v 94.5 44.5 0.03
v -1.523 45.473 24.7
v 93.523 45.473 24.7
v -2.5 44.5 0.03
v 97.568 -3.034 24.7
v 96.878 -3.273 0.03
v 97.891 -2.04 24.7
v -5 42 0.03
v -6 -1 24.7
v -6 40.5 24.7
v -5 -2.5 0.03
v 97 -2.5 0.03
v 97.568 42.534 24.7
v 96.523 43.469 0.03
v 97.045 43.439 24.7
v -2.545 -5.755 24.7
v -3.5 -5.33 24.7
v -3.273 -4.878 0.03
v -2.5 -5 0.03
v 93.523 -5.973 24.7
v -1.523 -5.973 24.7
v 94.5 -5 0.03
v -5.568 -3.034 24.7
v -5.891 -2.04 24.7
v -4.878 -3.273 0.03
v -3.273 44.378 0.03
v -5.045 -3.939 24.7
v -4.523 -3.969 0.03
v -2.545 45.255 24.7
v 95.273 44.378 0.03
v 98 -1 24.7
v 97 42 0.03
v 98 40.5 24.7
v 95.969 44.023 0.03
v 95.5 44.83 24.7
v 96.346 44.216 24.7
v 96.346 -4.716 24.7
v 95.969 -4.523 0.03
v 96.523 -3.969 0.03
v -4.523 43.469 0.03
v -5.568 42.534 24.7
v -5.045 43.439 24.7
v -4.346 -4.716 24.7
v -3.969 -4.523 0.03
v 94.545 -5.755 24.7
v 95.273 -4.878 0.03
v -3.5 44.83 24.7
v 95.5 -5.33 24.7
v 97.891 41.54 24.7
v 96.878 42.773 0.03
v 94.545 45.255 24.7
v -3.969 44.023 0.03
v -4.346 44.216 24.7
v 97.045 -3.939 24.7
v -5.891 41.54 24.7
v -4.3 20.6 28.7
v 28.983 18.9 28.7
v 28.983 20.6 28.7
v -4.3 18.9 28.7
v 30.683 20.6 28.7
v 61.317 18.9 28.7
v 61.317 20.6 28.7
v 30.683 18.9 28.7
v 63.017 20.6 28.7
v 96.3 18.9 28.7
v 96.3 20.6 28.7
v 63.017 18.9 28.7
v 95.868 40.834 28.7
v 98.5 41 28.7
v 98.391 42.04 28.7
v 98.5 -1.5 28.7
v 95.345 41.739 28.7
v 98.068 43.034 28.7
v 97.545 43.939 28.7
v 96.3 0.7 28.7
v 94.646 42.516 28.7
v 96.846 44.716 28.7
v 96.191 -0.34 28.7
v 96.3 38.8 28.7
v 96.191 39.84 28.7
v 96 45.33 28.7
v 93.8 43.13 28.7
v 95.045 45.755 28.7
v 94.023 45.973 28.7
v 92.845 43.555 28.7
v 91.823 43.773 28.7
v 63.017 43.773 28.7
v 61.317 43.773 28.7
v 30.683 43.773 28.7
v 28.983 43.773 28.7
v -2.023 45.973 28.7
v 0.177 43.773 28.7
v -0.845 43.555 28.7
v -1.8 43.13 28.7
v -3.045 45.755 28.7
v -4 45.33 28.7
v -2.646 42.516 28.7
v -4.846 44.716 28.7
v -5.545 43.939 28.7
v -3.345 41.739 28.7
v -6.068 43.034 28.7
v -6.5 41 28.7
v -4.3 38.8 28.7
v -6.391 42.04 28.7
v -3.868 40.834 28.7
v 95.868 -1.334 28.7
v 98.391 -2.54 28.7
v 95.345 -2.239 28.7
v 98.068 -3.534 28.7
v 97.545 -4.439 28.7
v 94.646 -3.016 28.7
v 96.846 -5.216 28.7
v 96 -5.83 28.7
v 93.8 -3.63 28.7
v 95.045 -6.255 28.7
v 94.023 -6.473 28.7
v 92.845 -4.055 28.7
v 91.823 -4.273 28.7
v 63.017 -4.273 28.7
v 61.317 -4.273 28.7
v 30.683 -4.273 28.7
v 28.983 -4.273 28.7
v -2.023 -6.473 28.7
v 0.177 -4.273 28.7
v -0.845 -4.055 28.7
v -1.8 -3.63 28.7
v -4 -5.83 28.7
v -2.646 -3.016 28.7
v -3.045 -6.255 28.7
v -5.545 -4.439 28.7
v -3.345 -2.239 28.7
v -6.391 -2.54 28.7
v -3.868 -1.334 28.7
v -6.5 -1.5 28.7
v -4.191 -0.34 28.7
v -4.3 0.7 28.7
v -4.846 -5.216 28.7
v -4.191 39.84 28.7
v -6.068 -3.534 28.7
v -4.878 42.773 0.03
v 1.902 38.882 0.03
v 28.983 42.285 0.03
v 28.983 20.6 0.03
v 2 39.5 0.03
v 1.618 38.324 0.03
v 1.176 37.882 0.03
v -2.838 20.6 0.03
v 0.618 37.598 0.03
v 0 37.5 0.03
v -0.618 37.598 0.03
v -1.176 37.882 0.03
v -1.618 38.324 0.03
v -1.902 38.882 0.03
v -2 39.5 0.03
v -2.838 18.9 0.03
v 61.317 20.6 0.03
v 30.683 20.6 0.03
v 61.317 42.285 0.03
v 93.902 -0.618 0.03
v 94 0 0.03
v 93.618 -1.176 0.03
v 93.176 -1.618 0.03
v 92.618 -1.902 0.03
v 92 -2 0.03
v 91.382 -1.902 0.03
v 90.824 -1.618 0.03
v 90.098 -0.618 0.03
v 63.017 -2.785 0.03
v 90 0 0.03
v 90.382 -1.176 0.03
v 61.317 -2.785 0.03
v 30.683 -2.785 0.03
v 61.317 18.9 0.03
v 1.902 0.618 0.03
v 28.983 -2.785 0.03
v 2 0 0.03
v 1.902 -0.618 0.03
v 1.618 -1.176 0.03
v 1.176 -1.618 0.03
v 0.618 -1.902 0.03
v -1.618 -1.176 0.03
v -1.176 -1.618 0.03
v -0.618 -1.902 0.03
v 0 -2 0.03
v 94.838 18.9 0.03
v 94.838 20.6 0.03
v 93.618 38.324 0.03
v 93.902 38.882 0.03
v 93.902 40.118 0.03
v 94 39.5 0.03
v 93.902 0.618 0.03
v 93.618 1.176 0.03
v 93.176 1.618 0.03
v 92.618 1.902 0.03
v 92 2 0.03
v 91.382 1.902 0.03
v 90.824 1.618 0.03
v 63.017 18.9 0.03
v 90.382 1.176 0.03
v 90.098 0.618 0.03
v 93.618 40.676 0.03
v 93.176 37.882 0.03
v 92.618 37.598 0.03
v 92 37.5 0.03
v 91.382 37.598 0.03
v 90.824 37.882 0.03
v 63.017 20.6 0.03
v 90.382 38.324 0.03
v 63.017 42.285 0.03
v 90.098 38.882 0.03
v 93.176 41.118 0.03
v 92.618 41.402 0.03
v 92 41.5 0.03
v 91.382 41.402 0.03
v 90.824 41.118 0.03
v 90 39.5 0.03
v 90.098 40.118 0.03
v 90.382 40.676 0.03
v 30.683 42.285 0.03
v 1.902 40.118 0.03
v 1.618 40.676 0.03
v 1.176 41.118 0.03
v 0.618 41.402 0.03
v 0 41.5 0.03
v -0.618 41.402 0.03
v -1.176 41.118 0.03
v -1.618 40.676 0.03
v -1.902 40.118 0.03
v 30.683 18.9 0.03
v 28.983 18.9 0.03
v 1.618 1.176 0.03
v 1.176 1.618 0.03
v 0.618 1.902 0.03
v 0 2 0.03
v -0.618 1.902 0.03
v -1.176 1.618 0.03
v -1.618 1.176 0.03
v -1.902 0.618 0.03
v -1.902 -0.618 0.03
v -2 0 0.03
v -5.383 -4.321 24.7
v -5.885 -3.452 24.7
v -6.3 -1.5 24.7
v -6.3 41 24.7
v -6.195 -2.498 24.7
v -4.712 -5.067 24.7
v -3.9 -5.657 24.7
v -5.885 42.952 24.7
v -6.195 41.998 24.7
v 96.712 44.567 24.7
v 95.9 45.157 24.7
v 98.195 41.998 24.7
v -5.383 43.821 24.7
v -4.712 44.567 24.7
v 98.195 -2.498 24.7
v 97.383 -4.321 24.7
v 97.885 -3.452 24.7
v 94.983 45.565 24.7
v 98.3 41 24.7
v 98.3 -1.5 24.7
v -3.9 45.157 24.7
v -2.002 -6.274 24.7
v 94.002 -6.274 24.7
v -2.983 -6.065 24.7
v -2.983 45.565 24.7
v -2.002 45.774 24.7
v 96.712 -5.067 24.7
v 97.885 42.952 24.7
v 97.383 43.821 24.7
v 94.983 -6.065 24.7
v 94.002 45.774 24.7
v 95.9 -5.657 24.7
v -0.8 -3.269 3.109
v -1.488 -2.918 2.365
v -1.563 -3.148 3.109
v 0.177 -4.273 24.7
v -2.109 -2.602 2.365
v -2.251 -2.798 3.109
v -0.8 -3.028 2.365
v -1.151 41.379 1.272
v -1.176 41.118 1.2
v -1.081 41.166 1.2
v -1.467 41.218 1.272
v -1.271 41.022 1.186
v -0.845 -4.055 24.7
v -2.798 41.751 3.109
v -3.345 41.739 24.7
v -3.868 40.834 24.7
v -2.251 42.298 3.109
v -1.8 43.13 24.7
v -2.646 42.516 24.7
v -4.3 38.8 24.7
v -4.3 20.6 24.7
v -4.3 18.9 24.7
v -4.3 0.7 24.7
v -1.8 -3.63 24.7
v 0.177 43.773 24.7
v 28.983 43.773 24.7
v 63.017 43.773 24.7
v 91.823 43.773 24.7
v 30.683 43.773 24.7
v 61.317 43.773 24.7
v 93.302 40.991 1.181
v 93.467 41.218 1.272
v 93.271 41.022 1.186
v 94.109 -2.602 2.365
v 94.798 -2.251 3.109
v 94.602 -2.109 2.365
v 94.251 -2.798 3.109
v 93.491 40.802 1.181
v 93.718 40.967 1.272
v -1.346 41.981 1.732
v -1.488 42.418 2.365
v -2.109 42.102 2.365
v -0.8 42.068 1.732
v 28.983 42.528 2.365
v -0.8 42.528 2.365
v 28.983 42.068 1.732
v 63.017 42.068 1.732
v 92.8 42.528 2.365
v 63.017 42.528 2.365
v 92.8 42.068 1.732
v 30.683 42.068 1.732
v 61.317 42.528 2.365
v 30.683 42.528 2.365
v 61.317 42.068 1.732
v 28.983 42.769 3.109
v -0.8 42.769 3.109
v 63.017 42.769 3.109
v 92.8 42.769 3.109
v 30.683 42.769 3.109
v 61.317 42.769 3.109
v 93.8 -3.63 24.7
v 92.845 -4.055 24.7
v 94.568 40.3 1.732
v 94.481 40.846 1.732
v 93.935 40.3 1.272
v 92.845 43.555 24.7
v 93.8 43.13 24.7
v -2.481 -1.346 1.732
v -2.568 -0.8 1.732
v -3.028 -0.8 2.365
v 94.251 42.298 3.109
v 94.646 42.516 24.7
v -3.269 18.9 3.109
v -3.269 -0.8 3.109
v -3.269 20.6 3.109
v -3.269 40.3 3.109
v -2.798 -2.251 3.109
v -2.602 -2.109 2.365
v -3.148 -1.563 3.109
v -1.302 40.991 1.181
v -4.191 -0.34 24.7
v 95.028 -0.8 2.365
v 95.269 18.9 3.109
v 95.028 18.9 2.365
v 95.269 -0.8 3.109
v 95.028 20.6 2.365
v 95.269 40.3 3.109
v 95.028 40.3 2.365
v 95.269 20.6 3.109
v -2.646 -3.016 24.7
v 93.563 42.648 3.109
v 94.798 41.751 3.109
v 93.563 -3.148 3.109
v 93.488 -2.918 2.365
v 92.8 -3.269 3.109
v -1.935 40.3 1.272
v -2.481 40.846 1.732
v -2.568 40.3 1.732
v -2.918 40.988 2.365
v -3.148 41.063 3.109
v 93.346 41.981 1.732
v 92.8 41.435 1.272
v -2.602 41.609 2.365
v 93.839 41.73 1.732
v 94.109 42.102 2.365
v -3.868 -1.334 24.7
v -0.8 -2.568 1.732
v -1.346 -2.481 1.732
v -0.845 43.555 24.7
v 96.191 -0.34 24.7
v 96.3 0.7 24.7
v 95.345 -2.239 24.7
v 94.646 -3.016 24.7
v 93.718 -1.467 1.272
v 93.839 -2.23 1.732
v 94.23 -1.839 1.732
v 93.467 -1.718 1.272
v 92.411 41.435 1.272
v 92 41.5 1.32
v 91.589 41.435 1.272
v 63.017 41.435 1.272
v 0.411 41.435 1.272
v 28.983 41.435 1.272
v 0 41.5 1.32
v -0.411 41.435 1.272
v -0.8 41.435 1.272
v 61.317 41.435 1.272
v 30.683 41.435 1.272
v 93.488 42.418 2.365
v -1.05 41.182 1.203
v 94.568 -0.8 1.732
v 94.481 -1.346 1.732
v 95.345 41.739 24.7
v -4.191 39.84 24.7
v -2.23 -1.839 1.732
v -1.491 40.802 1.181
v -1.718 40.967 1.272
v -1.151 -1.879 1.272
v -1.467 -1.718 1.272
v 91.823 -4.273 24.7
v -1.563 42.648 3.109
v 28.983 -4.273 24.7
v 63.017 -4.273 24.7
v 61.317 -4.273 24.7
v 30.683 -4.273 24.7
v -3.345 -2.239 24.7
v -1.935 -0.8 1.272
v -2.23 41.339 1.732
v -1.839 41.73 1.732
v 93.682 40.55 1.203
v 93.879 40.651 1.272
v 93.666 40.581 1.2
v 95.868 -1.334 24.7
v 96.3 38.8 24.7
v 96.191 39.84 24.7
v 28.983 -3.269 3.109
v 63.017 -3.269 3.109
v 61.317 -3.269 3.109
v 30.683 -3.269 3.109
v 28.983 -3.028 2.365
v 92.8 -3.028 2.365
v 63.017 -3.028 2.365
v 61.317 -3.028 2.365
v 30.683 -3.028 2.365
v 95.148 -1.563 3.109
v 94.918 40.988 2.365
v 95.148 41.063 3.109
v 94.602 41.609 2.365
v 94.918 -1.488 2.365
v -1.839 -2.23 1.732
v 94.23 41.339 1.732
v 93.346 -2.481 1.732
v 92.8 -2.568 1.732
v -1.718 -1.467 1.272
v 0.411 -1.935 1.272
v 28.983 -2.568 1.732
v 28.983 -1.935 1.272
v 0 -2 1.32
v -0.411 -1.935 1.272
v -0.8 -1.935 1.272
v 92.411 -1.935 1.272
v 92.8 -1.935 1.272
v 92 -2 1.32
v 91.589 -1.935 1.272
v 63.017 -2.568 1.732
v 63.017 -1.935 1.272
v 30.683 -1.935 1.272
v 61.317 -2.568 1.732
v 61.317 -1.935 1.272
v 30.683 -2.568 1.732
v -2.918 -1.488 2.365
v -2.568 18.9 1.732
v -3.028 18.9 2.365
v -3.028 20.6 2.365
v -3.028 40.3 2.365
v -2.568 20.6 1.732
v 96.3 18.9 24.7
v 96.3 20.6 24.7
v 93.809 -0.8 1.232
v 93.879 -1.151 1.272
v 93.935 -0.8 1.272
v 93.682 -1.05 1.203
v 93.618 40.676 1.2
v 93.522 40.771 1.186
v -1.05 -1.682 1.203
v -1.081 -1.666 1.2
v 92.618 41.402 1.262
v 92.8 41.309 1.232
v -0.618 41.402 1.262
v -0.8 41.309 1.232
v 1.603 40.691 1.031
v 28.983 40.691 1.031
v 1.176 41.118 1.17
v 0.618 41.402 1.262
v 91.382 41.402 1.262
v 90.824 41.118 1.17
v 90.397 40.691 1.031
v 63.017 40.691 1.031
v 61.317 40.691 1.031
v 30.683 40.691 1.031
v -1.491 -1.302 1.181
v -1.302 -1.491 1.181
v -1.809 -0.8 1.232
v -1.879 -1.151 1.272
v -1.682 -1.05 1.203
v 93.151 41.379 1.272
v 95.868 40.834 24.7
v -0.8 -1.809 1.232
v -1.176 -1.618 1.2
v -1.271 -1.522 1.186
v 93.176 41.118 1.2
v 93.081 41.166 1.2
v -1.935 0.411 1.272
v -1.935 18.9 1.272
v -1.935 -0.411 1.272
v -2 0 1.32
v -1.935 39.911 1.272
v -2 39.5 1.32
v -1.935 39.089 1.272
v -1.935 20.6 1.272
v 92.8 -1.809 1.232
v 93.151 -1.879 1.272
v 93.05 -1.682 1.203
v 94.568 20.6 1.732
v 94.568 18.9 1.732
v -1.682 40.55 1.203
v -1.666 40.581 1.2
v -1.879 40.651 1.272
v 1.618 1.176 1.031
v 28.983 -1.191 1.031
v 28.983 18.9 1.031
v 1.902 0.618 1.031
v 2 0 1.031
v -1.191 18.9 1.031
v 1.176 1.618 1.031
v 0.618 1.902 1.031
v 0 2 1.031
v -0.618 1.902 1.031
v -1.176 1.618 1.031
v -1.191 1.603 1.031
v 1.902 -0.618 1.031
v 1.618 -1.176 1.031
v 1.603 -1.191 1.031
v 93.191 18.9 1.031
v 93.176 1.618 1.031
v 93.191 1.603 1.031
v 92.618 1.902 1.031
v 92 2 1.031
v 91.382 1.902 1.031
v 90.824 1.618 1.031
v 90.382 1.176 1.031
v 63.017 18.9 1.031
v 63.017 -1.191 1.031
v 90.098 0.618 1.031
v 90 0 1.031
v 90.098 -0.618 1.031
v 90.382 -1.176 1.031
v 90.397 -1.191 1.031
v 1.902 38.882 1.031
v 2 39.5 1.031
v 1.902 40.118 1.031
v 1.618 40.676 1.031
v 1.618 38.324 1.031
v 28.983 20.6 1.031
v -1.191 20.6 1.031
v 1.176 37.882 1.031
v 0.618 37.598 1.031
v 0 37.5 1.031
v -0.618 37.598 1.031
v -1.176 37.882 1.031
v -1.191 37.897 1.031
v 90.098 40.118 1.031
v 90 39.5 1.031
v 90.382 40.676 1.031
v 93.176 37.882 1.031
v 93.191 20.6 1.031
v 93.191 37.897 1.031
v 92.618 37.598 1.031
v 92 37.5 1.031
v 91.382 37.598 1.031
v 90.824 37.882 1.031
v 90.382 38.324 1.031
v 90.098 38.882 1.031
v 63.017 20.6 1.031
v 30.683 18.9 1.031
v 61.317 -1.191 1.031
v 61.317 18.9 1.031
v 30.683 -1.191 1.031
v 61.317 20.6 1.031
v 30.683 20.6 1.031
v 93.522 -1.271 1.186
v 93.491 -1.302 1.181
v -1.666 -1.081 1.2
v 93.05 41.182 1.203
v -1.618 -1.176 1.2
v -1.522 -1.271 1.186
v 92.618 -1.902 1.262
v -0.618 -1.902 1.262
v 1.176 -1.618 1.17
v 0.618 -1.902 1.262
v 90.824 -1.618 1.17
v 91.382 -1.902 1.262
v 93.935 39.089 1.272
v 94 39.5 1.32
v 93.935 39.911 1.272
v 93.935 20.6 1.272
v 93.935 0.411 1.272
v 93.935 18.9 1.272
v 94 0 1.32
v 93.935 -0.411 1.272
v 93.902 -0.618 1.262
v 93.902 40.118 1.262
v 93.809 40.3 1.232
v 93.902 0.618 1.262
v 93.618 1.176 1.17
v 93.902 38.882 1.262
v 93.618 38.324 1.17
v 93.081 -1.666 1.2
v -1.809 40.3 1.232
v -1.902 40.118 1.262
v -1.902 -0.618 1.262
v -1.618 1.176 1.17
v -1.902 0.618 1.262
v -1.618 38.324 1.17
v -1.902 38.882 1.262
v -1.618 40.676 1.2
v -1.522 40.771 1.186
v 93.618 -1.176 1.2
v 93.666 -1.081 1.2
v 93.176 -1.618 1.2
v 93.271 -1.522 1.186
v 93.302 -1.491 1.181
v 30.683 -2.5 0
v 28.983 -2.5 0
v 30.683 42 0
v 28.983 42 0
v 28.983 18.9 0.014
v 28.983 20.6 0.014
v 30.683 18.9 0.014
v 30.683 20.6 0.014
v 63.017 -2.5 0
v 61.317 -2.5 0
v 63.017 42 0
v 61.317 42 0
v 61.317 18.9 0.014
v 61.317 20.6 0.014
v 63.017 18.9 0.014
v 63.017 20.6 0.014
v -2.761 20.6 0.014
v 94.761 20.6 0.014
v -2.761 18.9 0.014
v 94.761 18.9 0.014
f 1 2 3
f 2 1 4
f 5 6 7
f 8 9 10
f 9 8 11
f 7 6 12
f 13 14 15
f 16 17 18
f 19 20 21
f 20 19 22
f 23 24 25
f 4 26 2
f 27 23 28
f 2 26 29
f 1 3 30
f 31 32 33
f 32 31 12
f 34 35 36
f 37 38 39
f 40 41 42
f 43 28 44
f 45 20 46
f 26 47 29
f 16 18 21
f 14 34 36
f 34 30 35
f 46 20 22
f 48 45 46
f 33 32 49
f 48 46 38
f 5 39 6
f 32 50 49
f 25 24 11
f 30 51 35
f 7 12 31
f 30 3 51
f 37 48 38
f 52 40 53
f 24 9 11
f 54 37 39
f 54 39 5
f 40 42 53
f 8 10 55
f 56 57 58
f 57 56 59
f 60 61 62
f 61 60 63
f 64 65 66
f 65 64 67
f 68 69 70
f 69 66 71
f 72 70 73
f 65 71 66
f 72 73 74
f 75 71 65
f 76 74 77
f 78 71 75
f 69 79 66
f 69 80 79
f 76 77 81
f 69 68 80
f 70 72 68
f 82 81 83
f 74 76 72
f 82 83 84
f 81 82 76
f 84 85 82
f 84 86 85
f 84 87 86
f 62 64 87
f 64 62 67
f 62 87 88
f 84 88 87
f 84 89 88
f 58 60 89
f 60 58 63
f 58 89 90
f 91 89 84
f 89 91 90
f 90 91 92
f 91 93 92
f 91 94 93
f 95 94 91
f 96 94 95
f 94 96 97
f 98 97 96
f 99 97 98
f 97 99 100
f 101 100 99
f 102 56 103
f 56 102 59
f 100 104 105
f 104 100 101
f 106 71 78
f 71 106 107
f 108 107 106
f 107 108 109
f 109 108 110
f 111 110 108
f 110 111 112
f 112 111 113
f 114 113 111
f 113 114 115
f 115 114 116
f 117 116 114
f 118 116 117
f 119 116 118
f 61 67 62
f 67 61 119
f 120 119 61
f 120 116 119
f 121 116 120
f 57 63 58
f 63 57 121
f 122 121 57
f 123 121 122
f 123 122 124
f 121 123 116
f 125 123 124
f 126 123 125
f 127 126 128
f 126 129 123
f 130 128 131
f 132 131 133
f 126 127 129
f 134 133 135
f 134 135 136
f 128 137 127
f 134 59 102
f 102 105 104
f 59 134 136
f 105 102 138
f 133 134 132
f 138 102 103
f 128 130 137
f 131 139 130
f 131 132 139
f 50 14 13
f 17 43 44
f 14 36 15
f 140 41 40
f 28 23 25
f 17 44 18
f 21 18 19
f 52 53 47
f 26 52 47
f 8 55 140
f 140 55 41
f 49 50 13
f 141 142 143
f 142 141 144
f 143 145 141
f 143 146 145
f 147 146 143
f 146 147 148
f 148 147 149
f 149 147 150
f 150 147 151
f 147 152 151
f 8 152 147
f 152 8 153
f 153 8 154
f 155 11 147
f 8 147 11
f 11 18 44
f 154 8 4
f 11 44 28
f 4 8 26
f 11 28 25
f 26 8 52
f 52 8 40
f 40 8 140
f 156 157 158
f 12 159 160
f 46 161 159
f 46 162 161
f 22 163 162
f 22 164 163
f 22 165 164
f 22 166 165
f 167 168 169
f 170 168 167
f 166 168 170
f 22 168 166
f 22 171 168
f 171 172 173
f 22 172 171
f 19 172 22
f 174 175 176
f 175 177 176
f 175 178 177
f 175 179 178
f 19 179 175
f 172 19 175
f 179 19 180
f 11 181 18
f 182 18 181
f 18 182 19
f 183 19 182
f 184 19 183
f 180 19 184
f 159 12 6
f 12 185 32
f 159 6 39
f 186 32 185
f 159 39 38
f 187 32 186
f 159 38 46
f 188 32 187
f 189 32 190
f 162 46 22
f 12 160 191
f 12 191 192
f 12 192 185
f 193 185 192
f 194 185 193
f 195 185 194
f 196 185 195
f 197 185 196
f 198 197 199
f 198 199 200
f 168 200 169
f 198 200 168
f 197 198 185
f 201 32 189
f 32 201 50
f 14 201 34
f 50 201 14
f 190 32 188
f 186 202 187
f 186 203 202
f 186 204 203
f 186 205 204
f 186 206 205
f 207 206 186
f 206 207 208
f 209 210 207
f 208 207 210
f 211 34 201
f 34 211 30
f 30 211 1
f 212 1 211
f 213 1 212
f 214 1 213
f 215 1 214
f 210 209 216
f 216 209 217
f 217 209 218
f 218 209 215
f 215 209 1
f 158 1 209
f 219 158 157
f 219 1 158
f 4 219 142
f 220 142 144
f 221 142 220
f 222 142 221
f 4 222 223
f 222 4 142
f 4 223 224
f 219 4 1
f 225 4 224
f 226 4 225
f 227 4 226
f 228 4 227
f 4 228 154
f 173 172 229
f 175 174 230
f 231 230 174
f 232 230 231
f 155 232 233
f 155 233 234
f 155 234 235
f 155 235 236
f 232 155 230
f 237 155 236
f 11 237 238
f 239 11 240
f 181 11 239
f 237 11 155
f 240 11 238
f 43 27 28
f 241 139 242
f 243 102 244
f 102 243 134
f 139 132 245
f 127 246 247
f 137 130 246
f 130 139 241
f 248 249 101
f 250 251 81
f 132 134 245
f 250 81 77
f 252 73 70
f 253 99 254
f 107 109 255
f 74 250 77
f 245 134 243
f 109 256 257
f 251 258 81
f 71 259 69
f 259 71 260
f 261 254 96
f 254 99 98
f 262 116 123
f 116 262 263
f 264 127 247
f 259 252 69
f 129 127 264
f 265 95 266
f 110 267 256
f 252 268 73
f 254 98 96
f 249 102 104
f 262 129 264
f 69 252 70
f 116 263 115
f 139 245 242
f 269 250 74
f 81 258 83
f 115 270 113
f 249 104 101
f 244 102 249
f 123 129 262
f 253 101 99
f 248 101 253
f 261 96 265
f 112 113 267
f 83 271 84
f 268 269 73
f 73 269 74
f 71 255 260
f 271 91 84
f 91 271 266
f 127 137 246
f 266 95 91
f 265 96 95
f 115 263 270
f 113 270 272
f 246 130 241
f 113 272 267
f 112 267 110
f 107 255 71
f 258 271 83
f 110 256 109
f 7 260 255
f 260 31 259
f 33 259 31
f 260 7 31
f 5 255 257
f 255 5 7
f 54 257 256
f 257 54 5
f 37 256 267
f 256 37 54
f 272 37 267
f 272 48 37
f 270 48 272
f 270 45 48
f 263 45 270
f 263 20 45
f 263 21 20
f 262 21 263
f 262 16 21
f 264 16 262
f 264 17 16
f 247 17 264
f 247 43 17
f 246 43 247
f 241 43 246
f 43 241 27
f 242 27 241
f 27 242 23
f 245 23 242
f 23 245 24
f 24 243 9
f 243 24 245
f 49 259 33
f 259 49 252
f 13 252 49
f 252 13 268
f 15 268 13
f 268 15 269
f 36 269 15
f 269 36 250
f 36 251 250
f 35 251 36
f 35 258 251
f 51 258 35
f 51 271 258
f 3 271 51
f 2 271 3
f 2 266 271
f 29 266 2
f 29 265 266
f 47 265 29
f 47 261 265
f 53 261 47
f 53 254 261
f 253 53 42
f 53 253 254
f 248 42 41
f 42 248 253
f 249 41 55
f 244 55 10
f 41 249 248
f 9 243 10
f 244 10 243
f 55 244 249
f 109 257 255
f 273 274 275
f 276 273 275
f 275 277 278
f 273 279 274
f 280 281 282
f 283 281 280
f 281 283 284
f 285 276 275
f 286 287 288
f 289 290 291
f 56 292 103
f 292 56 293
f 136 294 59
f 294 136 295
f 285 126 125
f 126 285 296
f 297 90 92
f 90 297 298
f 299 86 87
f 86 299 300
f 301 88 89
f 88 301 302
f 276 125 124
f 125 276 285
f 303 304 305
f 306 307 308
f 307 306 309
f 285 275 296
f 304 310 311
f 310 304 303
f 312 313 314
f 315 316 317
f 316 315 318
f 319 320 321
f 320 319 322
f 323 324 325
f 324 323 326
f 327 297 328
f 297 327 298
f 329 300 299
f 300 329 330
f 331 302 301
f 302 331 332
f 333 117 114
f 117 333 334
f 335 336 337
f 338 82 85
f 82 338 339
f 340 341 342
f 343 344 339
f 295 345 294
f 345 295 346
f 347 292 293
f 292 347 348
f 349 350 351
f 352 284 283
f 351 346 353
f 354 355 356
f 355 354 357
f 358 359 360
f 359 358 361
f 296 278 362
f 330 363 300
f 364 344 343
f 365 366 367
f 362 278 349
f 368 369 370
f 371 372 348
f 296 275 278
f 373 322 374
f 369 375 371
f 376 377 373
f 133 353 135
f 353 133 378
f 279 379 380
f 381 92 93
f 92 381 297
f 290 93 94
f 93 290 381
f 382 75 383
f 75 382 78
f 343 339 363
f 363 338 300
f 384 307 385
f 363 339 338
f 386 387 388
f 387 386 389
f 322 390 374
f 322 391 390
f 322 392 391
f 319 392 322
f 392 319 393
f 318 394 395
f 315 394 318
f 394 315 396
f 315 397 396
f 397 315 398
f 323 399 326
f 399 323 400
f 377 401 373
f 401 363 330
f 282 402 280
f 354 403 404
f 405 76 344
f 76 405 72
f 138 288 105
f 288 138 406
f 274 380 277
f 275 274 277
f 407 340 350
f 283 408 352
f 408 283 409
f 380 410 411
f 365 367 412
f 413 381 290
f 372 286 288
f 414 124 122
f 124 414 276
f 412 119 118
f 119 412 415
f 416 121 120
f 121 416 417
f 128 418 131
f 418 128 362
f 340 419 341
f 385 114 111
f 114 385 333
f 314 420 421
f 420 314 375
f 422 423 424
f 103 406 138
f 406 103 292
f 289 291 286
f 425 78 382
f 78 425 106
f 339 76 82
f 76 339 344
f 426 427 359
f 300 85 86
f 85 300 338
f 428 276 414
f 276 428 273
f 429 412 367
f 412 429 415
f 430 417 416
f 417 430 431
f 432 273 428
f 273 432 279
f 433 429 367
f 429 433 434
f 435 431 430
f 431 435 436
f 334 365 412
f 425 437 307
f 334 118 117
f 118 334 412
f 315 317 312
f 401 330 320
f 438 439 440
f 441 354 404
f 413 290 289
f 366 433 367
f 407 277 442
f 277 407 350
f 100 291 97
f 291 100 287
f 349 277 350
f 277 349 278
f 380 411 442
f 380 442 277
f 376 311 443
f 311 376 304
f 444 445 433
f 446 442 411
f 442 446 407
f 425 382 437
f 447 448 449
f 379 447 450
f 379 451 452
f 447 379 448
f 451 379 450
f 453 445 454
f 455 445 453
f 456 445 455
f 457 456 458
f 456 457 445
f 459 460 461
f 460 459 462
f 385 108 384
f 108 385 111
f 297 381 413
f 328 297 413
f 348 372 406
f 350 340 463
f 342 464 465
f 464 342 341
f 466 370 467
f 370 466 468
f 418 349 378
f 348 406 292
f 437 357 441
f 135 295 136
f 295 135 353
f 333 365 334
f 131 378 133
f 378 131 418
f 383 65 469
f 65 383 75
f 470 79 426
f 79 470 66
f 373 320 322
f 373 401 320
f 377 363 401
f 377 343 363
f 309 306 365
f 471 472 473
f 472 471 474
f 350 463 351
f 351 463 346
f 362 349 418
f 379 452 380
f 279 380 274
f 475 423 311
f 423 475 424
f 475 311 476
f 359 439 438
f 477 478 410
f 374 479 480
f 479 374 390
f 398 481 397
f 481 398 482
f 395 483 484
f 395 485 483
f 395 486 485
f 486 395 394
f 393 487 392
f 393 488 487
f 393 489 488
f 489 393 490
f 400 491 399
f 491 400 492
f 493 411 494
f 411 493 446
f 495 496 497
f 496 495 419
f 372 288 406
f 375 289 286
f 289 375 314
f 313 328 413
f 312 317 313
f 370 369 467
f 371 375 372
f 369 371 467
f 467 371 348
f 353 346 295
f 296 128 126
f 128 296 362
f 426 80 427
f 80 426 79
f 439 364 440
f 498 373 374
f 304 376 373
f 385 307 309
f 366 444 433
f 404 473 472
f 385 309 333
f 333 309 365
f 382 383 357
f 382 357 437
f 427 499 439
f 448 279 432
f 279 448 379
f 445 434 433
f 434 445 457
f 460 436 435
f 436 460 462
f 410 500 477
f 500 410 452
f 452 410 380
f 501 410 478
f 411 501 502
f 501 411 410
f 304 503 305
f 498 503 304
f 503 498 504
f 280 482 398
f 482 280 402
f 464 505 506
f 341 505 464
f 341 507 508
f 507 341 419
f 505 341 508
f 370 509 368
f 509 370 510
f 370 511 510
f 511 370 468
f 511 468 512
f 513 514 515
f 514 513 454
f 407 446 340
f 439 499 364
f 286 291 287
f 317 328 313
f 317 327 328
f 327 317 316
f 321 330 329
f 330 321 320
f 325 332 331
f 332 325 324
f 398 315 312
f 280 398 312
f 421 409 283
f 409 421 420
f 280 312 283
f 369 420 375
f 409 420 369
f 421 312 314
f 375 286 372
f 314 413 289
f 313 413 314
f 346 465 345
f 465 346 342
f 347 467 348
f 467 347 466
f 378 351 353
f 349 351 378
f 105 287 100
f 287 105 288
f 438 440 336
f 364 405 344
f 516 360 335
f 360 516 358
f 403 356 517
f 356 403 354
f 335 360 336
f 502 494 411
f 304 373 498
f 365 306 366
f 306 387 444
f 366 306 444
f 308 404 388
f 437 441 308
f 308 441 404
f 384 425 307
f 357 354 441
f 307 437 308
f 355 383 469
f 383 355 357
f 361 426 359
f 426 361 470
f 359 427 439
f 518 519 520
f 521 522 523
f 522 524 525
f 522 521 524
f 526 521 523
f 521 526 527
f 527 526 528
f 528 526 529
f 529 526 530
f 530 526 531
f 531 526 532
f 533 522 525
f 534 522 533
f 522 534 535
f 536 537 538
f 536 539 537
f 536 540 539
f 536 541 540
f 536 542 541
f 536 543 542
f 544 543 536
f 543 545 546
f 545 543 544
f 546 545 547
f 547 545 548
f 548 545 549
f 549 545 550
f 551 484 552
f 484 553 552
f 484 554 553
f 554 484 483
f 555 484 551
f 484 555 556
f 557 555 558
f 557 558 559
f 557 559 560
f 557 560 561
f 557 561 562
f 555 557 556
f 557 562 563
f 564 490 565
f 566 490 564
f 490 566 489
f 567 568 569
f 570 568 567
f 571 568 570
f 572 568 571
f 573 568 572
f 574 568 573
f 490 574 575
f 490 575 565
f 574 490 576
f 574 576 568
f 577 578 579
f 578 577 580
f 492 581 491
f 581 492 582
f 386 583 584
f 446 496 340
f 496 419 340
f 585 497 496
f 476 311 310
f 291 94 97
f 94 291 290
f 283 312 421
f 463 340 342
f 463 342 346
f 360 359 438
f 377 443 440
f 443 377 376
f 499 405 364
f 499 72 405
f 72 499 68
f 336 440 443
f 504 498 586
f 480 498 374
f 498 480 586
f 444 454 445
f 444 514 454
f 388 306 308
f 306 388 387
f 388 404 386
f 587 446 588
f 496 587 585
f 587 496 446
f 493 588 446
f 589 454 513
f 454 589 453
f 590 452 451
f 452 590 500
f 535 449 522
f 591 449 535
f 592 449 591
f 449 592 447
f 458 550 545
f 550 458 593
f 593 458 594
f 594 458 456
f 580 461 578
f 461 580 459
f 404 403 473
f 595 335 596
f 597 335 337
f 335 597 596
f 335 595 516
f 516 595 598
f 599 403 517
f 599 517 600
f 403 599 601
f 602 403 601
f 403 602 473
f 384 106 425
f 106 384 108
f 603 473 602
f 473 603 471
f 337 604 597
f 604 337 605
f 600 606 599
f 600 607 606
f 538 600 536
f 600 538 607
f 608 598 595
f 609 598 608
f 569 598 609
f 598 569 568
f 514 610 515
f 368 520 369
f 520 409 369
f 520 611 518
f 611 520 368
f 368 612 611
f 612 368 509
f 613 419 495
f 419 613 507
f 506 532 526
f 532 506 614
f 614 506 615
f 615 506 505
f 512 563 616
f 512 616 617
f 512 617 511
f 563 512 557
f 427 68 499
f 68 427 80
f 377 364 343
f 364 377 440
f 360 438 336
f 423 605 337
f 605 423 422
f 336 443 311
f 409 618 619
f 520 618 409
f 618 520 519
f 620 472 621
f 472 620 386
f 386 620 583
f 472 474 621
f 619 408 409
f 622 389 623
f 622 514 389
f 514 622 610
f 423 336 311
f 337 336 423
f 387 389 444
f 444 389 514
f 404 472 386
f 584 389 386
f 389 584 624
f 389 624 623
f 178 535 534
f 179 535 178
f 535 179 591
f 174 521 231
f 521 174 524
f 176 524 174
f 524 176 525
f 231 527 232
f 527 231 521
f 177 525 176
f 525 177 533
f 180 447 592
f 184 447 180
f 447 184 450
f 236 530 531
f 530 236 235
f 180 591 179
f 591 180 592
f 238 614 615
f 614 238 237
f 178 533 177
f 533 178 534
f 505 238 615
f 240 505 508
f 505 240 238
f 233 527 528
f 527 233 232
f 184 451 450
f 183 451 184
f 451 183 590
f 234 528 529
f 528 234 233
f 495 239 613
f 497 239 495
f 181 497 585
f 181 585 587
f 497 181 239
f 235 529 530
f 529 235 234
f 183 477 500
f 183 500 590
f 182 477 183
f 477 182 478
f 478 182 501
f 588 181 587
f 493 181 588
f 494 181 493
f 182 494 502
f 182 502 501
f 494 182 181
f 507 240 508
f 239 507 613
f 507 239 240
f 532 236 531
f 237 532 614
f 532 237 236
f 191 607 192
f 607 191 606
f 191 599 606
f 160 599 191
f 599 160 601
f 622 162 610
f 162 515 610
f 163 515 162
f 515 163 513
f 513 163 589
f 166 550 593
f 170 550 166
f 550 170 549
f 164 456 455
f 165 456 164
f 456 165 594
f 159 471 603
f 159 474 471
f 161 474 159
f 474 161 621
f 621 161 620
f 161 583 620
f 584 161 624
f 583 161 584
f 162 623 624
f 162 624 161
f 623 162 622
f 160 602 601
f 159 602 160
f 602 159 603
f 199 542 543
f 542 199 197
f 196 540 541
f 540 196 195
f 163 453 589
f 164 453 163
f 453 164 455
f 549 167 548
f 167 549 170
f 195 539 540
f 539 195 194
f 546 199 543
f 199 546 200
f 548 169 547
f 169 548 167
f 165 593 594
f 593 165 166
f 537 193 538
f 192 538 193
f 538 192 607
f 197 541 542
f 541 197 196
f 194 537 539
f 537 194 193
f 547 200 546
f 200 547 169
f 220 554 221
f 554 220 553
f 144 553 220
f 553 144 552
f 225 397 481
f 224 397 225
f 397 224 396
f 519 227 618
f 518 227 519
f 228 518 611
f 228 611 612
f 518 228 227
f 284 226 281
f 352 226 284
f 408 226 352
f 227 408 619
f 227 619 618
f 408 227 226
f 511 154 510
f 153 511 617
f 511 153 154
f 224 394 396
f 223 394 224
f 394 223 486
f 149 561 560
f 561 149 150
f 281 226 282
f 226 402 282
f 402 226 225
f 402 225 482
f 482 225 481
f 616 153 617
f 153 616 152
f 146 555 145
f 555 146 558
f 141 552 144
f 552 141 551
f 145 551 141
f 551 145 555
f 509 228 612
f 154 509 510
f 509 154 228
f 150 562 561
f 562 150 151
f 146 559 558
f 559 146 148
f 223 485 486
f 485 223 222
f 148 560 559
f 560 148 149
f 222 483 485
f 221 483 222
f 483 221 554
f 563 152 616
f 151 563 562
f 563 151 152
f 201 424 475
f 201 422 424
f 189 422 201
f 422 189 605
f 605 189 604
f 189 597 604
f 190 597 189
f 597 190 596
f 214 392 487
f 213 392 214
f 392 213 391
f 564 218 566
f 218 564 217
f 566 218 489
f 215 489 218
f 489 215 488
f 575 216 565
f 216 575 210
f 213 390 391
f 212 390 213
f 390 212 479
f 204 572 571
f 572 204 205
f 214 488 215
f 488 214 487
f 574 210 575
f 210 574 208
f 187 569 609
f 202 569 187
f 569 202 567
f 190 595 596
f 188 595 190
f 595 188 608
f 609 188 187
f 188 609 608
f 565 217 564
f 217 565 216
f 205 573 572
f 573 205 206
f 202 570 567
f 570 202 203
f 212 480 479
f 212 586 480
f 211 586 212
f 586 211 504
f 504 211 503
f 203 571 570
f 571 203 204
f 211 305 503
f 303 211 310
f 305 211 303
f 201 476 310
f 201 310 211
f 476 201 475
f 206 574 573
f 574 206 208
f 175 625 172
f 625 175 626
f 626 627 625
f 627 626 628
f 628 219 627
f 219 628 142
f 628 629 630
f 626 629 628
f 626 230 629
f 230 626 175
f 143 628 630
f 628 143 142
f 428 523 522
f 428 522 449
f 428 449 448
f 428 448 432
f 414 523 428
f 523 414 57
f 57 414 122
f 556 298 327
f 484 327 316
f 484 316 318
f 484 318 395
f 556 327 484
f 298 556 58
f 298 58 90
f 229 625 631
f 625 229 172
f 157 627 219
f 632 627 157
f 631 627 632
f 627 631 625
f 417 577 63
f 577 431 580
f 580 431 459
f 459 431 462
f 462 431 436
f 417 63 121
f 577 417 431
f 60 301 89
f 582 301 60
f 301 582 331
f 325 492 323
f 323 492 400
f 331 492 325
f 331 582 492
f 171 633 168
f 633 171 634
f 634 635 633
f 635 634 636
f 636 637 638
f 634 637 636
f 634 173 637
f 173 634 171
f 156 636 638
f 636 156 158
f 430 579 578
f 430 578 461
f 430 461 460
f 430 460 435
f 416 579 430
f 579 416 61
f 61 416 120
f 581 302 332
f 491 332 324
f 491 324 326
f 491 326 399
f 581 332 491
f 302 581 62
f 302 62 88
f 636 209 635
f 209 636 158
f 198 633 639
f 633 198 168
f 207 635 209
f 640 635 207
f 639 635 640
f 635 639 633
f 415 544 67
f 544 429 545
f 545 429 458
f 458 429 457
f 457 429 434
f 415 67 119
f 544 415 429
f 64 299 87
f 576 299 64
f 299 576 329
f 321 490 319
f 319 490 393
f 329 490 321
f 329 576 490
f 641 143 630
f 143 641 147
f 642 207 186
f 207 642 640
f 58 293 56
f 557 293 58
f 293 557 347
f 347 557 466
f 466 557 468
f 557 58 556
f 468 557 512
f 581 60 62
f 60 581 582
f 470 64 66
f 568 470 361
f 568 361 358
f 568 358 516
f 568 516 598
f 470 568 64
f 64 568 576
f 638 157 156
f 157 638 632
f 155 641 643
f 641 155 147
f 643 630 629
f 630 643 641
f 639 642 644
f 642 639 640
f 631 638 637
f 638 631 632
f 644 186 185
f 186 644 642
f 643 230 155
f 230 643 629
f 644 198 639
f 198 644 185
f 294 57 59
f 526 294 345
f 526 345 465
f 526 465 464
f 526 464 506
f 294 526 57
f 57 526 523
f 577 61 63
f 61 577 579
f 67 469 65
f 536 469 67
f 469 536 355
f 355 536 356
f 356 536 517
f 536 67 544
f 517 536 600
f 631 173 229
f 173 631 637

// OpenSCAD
// created by pretenda
// http://www.thingiverse.com/pretenda/designs
// modified by skytale
// http://www.thingiverse.com/skytale/designs

// If you are reading this, sorry for my spaghetti code.
// skytale :>> also sorry for mine

// Options!
//cube([39.5,92,50]);
/* [T-Boxx Insert] */
// What do you want to render out?
what = "boxx"; // [boxx:Boxx Insert,pegs:Pegs,both:Both Boxx Insert and Pegs]
// Which height?
h = "halfSize"; // [fullSize:fullSize,halfSize:halfSize]
// How many units wide?
modulesH = 2; // [1:8]
// How many units deep?
modulesV = 1; // [1:6]
// How many compartments in width?
numberOfHorizontalDivisions = 3; // [1:10]
// How many compartments in depth?
numberOfVerticalDivisions = 2; // [1:10]

/* [Misc Parameters] */
// Wall Thickness. Too thin and it is a bit flimsy, 1.7 seems about right for me.
wallThickness = 1.7;
// Peg Diameter. This width for me is quite snug, might need to dial it down depending on your printer.
pegDiameter = 7.4;

/* [Hidden] */
pegDistance = 39.5; //92 for two -- so 13 difference
baseCornerDiameter = 5;
topCornerDiameter = 10;
topWidth = 52.5;
topLowerWidth = 51.5;
topInnerDiameter = 48.5;
bottomWidth = 49.5;
height = (h == "fullSize")? 60.7:28.7; 
// fullSize: 63-2.3 for pegs
// halfSize: 31-2.3 for pegs



pegSlackH = (modulesH - 1) * 13;
pegSlackV = (modulesV - 1) * 13;

blPosX = 0;
blPosY = 0;

brPosX = modulesH * pegDistance + pegSlackH;
brPosY = 0;

tlPosX = 0;
tlPosY = modulesV * pegDistance + pegSlackV;

trPosX = modulesH * pegDistance + pegSlackH;
trPosY = modulesV * pegDistance + pegSlackV;

// Pegs?!
/*translate([0,0,-2]) {
cylinder(2, pegDiameter / 2, pegDiameter / 2);
translate([brPosX, 0, 0]) cylinder(2, pegDiameter / 2, pegDiameter / 2);
translate([0, tlPosY, 0]) cylinder(2, pegDiameter / 2, pegDiameter / 2);
translate([trPosX, trPosY, 0]) cylinder(2, pegDiameter / 2, pegDiameter / 2);
}*/

module boxx()
{

difference()
{

union()
{
hull()
{

translate([-(bottomWidth - pegDistance) / 2 + baseCornerDiameter / 2, -(bottomWidth - pegDistance) / 2 + baseCornerDiameter / 2, 0.03]) #cylinder(2, baseCornerDiameter/2,baseCornerDiameter/2, $fn = 20);


translate([brPosX, brPosY, 0]) translate([(bottomWidth - pegDistance) / 2 - baseCornerDiameter / 2, -(bottomWidth - pegDistance) / 2 + baseCornerDiameter / 2, 0.03]) #cylinder(2, baseCornerDiameter/2,baseCornerDiameter/2, $fn = 20);

translate([tlPosX, tlPosY, 0]) translate([-(bottomWidth - pegDistance) / 2 + baseCornerDiameter / 2, (bottomWidth - pegDistance) / 2 - baseCornerDiameter / 2, 0.03]) #cylinder(2, baseCornerDiameter/2,baseCornerDiameter/2, $fn = 20);

translate([trPosX, trPosY, 0]) translate([(bottomWidth - pegDistance) / 2 - baseCornerDiameter / 2, (bottomWidth - pegDistance) / 2 - baseCornerDiameter / 2, 0.03]) #cylinder(2, baseCornerDiameter/2,baseCornerDiameter/2, $fn = 20);

// Bottom
translate([blPosX, blPosY, height]) translate([-(topLowerWidth - pegDistance) / 2 + topCornerDiameter / 2, -(topLowerWidth - pegDistance) / 2 + topCornerDiameter / 2, -4]) cylinder(4, topCornerDiameter / 2, topCornerDiameter / 2, $fn = 30);

translate([brPosX, brPosY, height]) translate([(topLowerWidth - pegDistance) / 2 - topCornerDiameter / 2, -(topLowerWidth - pegDistance) / 2 + topCornerDiameter / 2, -4]) cylinder(4, topCornerDiameter / 2, topCornerDiameter / 2, $fn = 30);

translate([tlPosX, tlPosY, height]) translate([-(topLowerWidth - pegDistance) / 2 + topCornerDiameter / 2, (topLowerWidth - pegDistance) / 2 - topCornerDiameter / 2, -4]) cylinder(4, topCornerDiameter / 2, topCornerDiameter / 2, $fn = 30);

translate([trPosX, trPosY, height]) translate([(topLowerWidth - pegDistance) / 2 - topCornerDiameter / 2, (topLowerWidth - pegDistance) / 2 - topCornerDiameter / 2, -4]) cylinder(4, topCornerDiameter / 2, topCornerDiameter / 2, $fn = 30);
}


hull()
{


translate([blPosX, blPosY, height]) translate([-(topWidth - pegDistance) / 2 + topCornerDiameter / 2, -(topWidth - pegDistance) / 2 + topCornerDiameter / 2, -4]) cylinder(4, topCornerDiameter / 2 -0.2, topCornerDiameter / 2, $fn = 30);

translate([brPosX, brPosY, height]) translate([(topWidth - pegDistance) / 2 - topCornerDiameter / 2, -(topWidth - pegDistance) / 2 + topCornerDiameter / 2, -4]) cylinder(4, topCornerDiameter / 2 -0.2, topCornerDiameter / 2, $fn = 30);

translate([tlPosX, tlPosY, height]) translate([-(topWidth - pegDistance) / 2 + topCornerDiameter / 2, (topWidth - pegDistance) / 2 - topCornerDiameter / 2, -4]) cylinder(4, topCornerDiameter / 2 -0.2, topCornerDiameter / 2, $fn = 30);

translate([trPosX, trPosY, height]) translate([(topWidth - pegDistance) / 2 - topCornerDiameter / 2, (topWidth - pegDistance) / 2 - topCornerDiameter / 2, -4]) cylinder(4, topCornerDiameter / 2 -0.2, topCornerDiameter / 2, $fn = 30);

}
}




 // inside carved out
hull()
{
translate([blPosX +wallThickness, blPosY + wallThickness, 1]) translate([-(bottomWidth - pegDistance) / 2 + baseCornerDiameter / 2, -(bottomWidth - pegDistance) / 2 + baseCornerDiameter / 2, baseCornerDiameter / 2]) sphere(baseCornerDiameter/2, $fn = 20);

translate([brPosX - wallThickness, brPosY + wallThickness, 1]) translate([(bottomWidth - pegDistance) / 2 - baseCornerDiameter / 2, -(bottomWidth - pegDistance) / 2 + baseCornerDiameter / 2, baseCornerDiameter / 2]) sphere(baseCornerDiameter/2, $fn = 20);

translate([tlPosX + wallThickness, tlPosY - wallThickness, 1]) translate([-(bottomWidth - pegDistance) / 2 + baseCornerDiameter / 2, (bottomWidth - pegDistance) / 2 - baseCornerDiameter / 2, baseCornerDiameter / 2]) sphere(baseCornerDiameter/2, $fn = 20);

translate([trPosX - wallThickness, trPosY - wallThickness, 1]) translate([(bottomWidth - pegDistance) / 2 - baseCornerDiameter / 2, (bottomWidth - pegDistance) / 2 - baseCornerDiameter / 2, baseCornerDiameter / 2]) sphere(baseCornerDiameter/2, $fn = 20);

// Bottom
translate([blPosX + wallThickness, blPosY + wallThickness, height]) translate([-(topLowerWidth - pegDistance) / 2 + topCornerDiameter / 2, -(topLowerWidth - pegDistance) / 2 + topCornerDiameter / 2, -4]) cylinder(5, topCornerDiameter / 2, topCornerDiameter / 2, $fn = 30);

translate([brPosX - wallThickness, brPosY + wallThickness, height]) translate([(topLowerWidth - pegDistance) / 2 - topCornerDiameter / 2, -(topLowerWidth - pegDistance) / 2 + topCornerDiameter / 2, -4]) cylinder(5, topCornerDiameter / 2, topCornerDiameter / 2, $fn = 30);

translate([tlPosX + wallThickness, tlPosY - wallThickness, height]) translate([-(topLowerWidth - pegDistance) / 2 + topCornerDiameter / 2, (topLowerWidth - pegDistance) / 2 - topCornerDiameter / 2, -4]) cylinder(5, topCornerDiameter / 2, topCornerDiameter / 2, $fn = 30);

translate([trPosX - wallThickness, trPosY- wallThickness, height]) translate([(topLowerWidth - pegDistance) / 2 - topCornerDiameter / 2, (topLowerWidth - pegDistance) / 2 - topCornerDiameter / 2, -4]) cylinder(5, topCornerDiameter / 2, topCornerDiameter / 2, $fn = 30);
}


// Holes for pegs to slot into

cylinder(20, 2, 2, $fn = 20);
translate([brPosX, 0, 0]) cylinder(20, 2, 2, $fn = 20);
translate([0, tlPosY, 0]) cylinder(20, 2, 2, $fn = 20);
translate([trPosX, trPosY, 0]) cylinder(20, 2, 2, $fn = 20);

}
}




module peg() {
union()
{
cylinder(2, pegDiameter/2, pegDiameter/2, $fn = 20);
translate([0,0,1]) cylinder(2, 1.8, 1.8, $fn = 20);
}
}


if (what == "boxx" || what == "both")
{
// Boxx!

boxx();
makeDivisions();

}

if (what == "pegs" || what == "both")
{
// Pegs!
translate([-20,0,0]) {
translate([0, 0, 0]) peg();
translate([0, pegDiameter + 2, 0]) peg();
translate([0, (pegDiameter+2)*2, 0]) peg();
translate([0, (pegDiameter+2)*3, 0]) peg();
}

}

// SUBDIVISIONS

rim = 0;
module makeDivisions(){
 if(numberOfVerticalDivisions >= 2){
  for (i = [1 : numberOfVerticalDivisions-1]){
	vDevide(((tlPosY + (bottomWidth - pegDistance) / 2) / numberOfVerticalDivisions) * i);
	//vDevide(0);
	//vDevide(tlPosY + (bottomWidth - pegDistance) / 2);
  }
 }
 if(numberOfHorizontalDivisions >= 2){
  for (i = [1 : numberOfHorizontalDivisions-1]){
  	hDevide(((brPosX + (bottomWidth - pegDistance) / 2) / numberOfHorizontalDivisions) * i);
	//hDevide(0);
	//hDevide(brPosX + (bottomWidth - pegDistance) / 2);
  }
 }
}

module vDevide(pos){
translate([0,pos,0])
hull()
{
translate([-(bottomWidth - pegDistance) / 2 + baseCornerDiameter / 2, -(bottomWidth - pegDistance) / 2 + baseCornerDiameter / 2, baseCornerDiameter / 2]) 
	rotate([90,0,0]) translate([0,0,-wallThickness/2]) cylinder(wallThickness, baseCornerDiameter / 2, baseCornerDiameter / 2, $fn = 30);
translate([brPosX, 0, 0]) translate([(bottomWidth - pegDistance) / 2 - baseCornerDiameter / 2, -(bottomWidth - pegDistance) / 2 + baseCornerDiameter / 2, baseCornerDiameter / 2]) 
	rotate([90,0,0]) translate([0,0,-wallThickness/2]) cylinder(wallThickness, baseCornerDiameter / 2, baseCornerDiameter / 2, $fn = 30);
translate([blPosX, 0, height]) translate([-(topLowerWidth - pegDistance) / 2, -(bottomWidth - pegDistance) / 2 + baseCornerDiameter / 2, -rim])
	translate([wallThickness/2, 0, -wallThickness/2]) cube(size = [wallThickness, wallThickness, wallThickness], center = true);
translate([brPosX, 0, height]) translate([(topLowerWidth - pegDistance) / 2, -(bottomWidth - pegDistance) / 2 + baseCornerDiameter / 2, -rim])
	translate([-wallThickness/2, 0, -wallThickness/2]) cube(size = [wallThickness, wallThickness, wallThickness], center = true);
}
}

module hDevide(pos){
translate([pos,0,0])
hull()
{
translate([-(bottomWidth - pegDistance) / 2 + baseCornerDiameter / 2, -(bottomWidth - pegDistance) / 2 + baseCornerDiameter / 2, baseCornerDiameter / 2]) 
	rotate([0,-90,0]) translate([0,0,-wallThickness/2]) cylinder(wallThickness, baseCornerDiameter / 2, baseCornerDiameter / 2, $fn = 30);
translate([0, tlPosY, 0]) translate([-(bottomWidth - pegDistance) / 2 + baseCornerDiameter / 2, (bottomWidth - pegDistance) / 2 - baseCornerDiameter / 2, baseCornerDiameter / 2])
	rotate([0,-90,0]) translate([0,0,-wallThickness/2]) cylinder(wallThickness, baseCornerDiameter / 2, baseCornerDiameter / 2, $fn = 30);
translate([0, tlPosY, height]) translate([-(bottomWidth - pegDistance) / 2 + baseCornerDiameter / 2, (topLowerWidth - pegDistance) / 2, -rim])
	translate([0, -wallThickness/2, -wallThickness/2]) cube(size = [wallThickness, wallThickness, wallThickness], center = true);
translate([0, blPosY, height]) translate([-(bottomWidth - pegDistance) / 2 + baseCornerDiameter / 2, -(topLowerWidth - pegDistance) / 2, -rim])
	translate([0, wallThickness/2, -wallThickness/2]) cube(size = [wallThickness, wallThickness, wallThickness], center = true);
}
}
